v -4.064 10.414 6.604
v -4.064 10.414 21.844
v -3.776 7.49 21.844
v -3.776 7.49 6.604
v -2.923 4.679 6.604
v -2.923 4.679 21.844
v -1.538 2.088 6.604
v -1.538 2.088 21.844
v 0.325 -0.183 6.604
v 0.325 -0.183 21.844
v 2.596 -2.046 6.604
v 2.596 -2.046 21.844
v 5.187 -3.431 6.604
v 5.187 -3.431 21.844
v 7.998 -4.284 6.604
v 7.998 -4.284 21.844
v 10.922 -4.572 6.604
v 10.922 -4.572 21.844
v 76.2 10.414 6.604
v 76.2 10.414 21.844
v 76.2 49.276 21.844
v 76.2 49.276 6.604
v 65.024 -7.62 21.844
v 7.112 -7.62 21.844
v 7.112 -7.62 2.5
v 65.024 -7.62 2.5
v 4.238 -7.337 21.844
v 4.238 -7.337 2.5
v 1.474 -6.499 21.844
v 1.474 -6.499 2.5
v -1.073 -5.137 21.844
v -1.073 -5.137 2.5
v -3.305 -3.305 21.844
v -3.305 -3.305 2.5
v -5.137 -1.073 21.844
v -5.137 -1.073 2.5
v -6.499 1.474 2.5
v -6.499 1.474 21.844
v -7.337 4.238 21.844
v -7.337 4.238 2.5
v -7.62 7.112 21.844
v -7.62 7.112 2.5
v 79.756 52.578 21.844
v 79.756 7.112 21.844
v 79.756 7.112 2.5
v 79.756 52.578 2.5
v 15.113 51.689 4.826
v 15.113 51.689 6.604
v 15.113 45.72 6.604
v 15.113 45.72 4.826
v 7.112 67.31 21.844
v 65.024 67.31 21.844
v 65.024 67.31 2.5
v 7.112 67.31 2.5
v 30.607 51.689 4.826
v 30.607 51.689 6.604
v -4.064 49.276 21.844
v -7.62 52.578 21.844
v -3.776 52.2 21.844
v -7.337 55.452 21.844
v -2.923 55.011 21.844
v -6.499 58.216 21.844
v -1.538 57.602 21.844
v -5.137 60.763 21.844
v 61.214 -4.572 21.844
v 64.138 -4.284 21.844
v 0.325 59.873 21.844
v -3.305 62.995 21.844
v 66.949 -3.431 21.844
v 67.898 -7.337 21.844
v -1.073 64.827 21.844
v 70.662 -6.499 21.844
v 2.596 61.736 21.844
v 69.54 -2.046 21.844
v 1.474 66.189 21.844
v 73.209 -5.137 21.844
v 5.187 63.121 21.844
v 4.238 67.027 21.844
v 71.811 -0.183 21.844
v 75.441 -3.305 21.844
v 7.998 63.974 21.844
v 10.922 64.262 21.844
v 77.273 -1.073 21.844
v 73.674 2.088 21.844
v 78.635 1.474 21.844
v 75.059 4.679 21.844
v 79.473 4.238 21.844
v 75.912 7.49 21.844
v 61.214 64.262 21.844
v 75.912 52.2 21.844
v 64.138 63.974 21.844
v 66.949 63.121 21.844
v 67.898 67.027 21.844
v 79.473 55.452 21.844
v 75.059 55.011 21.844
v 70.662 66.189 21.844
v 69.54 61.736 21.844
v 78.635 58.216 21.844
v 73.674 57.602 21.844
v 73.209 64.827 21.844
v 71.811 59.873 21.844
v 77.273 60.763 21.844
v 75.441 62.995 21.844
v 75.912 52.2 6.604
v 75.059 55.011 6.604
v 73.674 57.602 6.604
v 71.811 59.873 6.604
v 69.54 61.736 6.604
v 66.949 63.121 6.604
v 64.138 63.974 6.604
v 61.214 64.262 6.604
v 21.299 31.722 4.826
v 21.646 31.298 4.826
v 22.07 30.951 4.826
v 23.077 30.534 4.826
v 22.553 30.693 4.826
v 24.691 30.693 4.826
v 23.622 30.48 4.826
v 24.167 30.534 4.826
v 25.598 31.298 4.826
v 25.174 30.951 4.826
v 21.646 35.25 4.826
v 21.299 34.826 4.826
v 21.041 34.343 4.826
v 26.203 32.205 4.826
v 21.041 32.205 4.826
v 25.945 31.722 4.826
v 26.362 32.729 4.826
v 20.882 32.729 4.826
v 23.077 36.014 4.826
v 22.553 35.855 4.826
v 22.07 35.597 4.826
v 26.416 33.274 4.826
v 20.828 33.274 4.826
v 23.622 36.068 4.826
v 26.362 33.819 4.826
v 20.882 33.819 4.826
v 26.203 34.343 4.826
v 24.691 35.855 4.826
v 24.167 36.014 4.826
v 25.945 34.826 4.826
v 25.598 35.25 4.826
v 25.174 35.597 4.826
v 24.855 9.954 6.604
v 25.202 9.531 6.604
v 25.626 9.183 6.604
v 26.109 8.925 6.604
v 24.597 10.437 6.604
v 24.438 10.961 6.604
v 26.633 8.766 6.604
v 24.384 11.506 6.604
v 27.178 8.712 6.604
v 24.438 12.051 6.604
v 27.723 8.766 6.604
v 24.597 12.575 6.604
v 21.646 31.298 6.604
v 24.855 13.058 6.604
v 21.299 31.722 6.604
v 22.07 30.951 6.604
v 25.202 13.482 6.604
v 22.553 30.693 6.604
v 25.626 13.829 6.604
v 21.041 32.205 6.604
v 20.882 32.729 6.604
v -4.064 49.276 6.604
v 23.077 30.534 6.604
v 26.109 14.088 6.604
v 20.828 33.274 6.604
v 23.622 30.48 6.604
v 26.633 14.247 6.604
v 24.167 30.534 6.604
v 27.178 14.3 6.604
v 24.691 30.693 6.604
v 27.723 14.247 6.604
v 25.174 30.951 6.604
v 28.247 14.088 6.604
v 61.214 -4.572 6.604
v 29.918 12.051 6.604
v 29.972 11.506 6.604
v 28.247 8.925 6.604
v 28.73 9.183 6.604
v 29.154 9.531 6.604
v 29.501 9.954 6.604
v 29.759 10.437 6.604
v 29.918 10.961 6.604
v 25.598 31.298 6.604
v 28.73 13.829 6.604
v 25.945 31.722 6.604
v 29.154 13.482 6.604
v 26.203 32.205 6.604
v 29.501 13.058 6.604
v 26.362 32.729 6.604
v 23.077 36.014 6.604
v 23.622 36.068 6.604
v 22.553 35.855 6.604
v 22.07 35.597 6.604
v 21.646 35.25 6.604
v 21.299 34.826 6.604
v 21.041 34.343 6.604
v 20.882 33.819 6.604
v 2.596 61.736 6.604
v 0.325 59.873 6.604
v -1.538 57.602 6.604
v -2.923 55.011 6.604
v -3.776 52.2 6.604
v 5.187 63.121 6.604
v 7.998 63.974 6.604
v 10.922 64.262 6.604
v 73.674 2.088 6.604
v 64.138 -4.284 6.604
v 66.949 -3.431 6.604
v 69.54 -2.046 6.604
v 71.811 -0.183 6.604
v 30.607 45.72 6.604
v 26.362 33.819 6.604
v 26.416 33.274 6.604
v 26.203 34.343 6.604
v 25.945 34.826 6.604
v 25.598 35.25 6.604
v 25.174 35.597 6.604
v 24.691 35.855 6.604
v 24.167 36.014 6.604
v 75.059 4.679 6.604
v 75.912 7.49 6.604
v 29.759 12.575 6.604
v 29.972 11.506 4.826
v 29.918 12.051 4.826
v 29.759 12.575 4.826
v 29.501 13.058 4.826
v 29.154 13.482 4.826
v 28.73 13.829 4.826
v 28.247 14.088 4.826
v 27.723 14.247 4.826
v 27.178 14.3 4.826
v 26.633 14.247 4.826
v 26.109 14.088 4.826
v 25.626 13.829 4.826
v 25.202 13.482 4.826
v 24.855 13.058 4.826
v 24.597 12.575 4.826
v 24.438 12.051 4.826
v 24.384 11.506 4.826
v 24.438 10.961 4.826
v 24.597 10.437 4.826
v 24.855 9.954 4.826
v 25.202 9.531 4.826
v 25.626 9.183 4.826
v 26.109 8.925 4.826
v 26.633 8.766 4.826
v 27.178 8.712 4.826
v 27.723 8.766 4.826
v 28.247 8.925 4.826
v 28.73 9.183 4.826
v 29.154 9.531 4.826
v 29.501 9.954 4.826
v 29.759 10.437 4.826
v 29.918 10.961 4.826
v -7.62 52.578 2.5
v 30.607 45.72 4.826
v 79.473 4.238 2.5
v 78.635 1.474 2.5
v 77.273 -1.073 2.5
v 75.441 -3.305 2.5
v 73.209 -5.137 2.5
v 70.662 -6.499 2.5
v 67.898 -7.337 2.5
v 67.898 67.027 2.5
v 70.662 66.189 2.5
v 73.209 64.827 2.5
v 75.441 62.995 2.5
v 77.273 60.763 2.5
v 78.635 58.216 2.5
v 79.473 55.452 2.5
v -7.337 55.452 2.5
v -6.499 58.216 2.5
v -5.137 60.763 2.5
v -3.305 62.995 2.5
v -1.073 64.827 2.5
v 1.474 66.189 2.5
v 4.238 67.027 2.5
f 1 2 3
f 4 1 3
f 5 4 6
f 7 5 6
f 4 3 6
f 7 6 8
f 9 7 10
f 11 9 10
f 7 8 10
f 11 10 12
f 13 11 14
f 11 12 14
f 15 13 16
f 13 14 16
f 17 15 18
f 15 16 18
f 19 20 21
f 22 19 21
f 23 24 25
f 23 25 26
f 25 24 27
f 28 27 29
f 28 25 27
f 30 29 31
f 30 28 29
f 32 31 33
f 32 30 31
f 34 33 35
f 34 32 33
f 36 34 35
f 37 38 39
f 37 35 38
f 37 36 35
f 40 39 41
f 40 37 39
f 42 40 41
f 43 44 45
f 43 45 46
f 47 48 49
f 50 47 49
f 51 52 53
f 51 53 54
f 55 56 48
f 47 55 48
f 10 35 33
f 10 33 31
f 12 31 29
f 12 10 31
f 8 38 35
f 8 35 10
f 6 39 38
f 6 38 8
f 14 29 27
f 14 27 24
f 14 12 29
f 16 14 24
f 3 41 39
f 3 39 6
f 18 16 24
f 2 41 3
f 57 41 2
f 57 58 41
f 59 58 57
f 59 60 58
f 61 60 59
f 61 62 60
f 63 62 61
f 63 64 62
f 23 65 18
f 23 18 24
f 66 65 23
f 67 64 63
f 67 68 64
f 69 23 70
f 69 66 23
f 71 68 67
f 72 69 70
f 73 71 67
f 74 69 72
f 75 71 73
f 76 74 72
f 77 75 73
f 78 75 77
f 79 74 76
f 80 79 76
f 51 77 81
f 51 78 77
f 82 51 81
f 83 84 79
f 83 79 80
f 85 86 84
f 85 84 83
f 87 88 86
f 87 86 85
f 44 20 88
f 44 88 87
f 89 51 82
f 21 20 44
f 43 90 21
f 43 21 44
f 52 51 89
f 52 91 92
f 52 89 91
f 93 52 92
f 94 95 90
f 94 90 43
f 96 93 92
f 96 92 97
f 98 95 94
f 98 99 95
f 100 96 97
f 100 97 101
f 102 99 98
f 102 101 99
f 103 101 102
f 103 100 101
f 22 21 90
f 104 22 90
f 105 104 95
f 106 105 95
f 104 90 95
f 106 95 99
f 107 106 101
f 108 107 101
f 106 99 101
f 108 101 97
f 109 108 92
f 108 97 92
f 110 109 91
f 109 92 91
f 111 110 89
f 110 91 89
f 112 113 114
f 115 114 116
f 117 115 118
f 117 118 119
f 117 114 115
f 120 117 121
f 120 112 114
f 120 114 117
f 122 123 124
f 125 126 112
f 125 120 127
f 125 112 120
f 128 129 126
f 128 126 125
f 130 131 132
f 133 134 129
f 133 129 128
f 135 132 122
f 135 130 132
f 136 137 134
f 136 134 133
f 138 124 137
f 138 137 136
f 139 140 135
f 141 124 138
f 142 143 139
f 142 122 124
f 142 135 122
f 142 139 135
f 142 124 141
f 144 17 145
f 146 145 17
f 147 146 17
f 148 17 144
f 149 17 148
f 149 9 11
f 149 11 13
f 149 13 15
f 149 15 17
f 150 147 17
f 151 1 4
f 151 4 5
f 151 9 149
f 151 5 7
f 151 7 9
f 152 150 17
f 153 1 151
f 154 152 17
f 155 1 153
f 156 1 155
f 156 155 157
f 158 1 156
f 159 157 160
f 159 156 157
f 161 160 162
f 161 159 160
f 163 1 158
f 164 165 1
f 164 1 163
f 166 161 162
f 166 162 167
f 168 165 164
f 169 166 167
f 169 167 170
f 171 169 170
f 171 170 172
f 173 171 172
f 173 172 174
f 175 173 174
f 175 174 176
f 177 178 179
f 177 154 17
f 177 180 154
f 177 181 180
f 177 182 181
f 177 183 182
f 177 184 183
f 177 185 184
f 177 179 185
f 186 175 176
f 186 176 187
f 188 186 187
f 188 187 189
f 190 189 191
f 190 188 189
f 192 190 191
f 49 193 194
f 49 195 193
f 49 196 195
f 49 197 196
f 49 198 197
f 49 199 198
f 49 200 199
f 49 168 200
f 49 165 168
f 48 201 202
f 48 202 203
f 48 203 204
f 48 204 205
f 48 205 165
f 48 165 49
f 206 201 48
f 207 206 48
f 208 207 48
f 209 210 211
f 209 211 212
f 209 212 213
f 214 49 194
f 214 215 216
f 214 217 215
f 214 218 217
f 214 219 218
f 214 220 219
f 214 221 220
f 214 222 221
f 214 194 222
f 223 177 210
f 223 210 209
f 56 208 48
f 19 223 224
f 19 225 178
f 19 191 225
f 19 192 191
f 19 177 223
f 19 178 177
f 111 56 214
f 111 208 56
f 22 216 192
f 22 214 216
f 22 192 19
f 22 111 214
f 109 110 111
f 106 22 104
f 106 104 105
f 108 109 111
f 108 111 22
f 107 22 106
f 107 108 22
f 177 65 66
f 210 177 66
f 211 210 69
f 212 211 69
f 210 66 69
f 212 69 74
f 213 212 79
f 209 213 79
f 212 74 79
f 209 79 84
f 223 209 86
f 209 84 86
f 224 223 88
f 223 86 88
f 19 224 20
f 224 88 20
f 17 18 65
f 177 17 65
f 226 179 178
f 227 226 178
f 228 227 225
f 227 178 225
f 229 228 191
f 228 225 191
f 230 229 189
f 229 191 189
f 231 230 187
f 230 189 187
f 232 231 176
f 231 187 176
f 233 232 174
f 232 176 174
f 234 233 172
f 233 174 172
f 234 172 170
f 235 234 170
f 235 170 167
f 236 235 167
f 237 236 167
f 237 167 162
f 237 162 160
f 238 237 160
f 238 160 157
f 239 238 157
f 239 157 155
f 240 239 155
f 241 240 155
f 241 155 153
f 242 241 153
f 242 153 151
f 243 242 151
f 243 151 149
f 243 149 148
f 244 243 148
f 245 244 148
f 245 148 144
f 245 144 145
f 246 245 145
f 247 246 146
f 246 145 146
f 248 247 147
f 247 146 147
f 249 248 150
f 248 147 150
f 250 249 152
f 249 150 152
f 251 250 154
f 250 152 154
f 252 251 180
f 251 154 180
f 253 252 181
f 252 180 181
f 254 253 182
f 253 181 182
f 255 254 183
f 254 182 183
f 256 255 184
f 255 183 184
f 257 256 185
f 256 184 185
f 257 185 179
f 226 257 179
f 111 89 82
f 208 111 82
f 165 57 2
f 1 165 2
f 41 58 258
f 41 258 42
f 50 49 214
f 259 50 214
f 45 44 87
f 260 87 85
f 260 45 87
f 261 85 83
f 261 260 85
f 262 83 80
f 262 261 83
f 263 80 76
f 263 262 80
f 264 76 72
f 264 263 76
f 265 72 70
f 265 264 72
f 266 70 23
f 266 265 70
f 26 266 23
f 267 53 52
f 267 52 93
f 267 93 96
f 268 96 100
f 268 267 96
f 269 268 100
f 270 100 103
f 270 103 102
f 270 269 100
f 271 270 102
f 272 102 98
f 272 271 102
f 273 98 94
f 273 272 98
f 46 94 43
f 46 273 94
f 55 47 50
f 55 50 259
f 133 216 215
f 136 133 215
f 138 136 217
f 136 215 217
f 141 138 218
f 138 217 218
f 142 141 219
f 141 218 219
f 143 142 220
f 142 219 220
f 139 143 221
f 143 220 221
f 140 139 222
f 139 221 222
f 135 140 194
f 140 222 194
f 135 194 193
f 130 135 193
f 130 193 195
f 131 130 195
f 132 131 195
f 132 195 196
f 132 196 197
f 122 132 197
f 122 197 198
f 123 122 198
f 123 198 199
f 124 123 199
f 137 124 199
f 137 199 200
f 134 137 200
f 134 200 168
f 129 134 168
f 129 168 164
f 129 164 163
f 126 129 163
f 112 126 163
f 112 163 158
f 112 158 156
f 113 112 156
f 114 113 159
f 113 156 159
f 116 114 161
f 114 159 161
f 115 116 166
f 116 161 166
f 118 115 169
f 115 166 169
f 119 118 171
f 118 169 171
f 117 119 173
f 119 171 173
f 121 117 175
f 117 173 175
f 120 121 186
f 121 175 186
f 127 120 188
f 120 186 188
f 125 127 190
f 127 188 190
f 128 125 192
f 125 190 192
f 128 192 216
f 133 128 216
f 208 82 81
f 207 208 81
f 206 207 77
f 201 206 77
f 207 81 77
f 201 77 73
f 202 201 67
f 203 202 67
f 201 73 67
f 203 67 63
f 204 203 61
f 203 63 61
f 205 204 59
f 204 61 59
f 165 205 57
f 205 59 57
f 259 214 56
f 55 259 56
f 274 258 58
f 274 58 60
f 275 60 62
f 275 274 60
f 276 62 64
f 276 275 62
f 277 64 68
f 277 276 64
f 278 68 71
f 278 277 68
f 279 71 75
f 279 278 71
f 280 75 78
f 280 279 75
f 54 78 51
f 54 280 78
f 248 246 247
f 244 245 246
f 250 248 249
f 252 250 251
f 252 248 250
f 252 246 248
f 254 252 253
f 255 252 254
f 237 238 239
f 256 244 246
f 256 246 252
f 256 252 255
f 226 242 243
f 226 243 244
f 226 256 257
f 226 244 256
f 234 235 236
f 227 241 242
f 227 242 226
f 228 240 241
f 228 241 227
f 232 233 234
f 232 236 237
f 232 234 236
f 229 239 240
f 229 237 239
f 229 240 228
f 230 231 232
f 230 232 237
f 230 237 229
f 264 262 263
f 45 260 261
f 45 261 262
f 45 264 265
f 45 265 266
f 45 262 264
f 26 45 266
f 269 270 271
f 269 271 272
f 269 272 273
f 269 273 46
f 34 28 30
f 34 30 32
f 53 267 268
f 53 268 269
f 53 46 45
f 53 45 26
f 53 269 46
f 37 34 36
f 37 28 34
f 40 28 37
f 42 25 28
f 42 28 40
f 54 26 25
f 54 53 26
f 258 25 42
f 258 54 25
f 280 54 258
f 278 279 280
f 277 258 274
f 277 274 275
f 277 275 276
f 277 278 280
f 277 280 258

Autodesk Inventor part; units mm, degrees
ref_plane "YZ Plane" through (0, 0, 0) normal (1, 0, 0) x (0, 1, 0)
ref_plane "XZ Plane" through (0, 0, 0) normal (0, 1, 0) x (-1, 0, 0)
ref_plane "XY Plane" through (0, 0, 0) normal (0, 0, 1) x (1, 0, 0)
sketch "Sketch1" plane through (0, 0, 0) normal (0, 0, 1) x (1, 0, 0)
  line L0 (0, 0) -> (72.136, 0)
  line L1 (72.136, 0) -> (72.136, 59.69)
  line L2 (72.136, 59.69) -> (0, 59.69)
  line L3 (0, 59.69) -> (0, 0)
  dimension "d0" = 59.69
  dimension "d1" = 72.136
extrude "Extrusion1" add sketch "Sketch1" along normal blind 21.844
sketch "Sketch2" plane through (0, 0, 21.844) normal (0, 0, 1) x (1, 0, 0)
  line L0 (3.048, 56.642) -> (69.088, 56.642)
  line L1 (69.088, 56.642) -> (69.088, 3.048)
  line L2 (69.088, 3.048) -> (3.048, 3.048)
  line L3 (3.048, 3.048) -> (3.048, 56.642)
  line L4 (72.136, 59.69) -> (0, 59.69) projected
  line L5 (72.136, 0) -> (72.136, 59.69) projected
  line L6 (0, 0) -> (72.136, 0) projected
  line L7 (0, 59.69) -> (0, 0) projected
  dimension "d4" = 3.048
  dimension "d5" = 3.048
  dimension "d6" = 3.048
  dimension "d7" = 3.048
extrude "Extrusion2" cut sketch "Sketch2" against normal blind 15.24 contours L0 L1 L2 L3
sketch "Sketch3" plane through (0, 0, 6.604) normal (0, 0, 1) x (1, 0, 0)
  line L0 (15.113, 45.72) -> (30.607, 45.72)
  line L1 (30.607, 45.72) -> (30.607, 51.689)
  line L2 (30.607, 51.689) -> (15.113, 51.689)
  line L3 (15.113, 51.689) -> (15.113, 45.72)
  line L4 (3.048, 56.642) -> (69.088, 56.642) projected
  line L5 (3.048, 3.048) -> (3.048, 56.642) projected
  circle A0 centre (23.622, 33.274) radius 2.794
  circle A1 centre (27.178, 11.5062) radius 2.794
  point P0 (0, 0)
  dimension "d10" = 5.969
  dimension "d11" = 15.494
  dimension "d12" = 4.953
  dimension "d13" = 12.065
  dimension "d14" = 5.588
  dimension "d15" = 5.588
  dimension "d17" = 24.13
  dimension "d18" = 20.574
  dimension "d21" = 23.368
  dimension "d22" = 45.1358
extrude "Extrusion3" cut sketch "Sketch3" against normal blind 1.778
sketch "Sketch4" plane through (0, 0, 21.844) normal (0, 0, 1) x (1, 0, 0)
  point P0 (0, 0)
sketch "Sketch5" plane through (0, 0, 21.844) normal (0, 0, 1) x (1, 0, 0)
  line L0 (-2.54, -2.54) -> (74.676, -2.54)
  line L1 (74.676, -2.54) -> (74.676, 62.23)
  line L2 (74.676, 62.23) -> (-2.54, 62.23)
  line L3 (-2.54, 62.23) -> (-2.54, -2.54)
  line L4 (72.136, 0) -> (72.136, 59.69) projected
  line L5 (72.136, 59.69) -> (0, 59.69) projected
  line L6 (0, 59.69) -> (0, 0) projected
  line L7 (0, 0) -> (72.136, 0) projected
  line L8 (0, 0) -> (72.136, 0)
  line L9 (72.136, 0) -> (72.136, 59.69)
  line L10 (72.136, 59.69) -> (0, 59.69)
  line L11 (0, 59.69) -> (0, 0)
  dimension "d23" = 2.54
  dimension "d24" = 2.54
  dimension "d25" = 2.54
  dimension "d26" = 2.54
extrude "Extrusion4" add sketch "Sketch5" against normal blind 21.844
sketch "Sketch6" plane through (0, 0, 21.844) normal (0, 0, 1) x (1, 0, 0)
  line L0 (-0.762, -0.762) -> (72.898, -0.762)
  line L1 (72.898, -0.762) -> (72.898, 60.452)
  line L2 (72.898, 60.452) -> (-0.762, 60.452)
  line L3 (-0.762, 60.452) -> (-0.762, -0.762)
  line L4 (3.048, 3.048) -> (3.048, 56.642) projected
  line L5 (3.048, 56.642) -> (69.088, 56.642) projected
  line L6 (69.088, 56.642) -> (69.088, 3.048) projected
  line L7 (69.088, 3.048) -> (3.048, 3.048) projected
  point P0 (0, 0)
  dimension "d29" = 3.81
  dimension "d30" = 3.81
  dimension "d31" = 3.81
  dimension "d32" = 3.81
extrude "Extrusion5" cut sketch "Sketch6" against normal blind 15.24
sketch "Sketch7" plane through (0, 0, 21.844) normal (0, 0, 1) x (1, 0, 0)
  point P0 (0, 0)
sketch "Sketch8" plane through (0, 0, 21.844) normal (0, 0, 1) x (1, 0, 0)
  line L0 (74.676, -2.54) -> (-2.54, -2.54) projected
  line L1 (-2.54, -2.54) -> (74.676, -2.54)
  line L2 (74.676, -2.54) -> (74.676, 62.23)
  line L3 (74.676, 62.23) -> (-2.54, 62.23)
  line L4 (-2.54, 62.23) -> (-2.54, -2.54)
  line L5 (-7.62, -7.62) -> (79.756, -7.62)
  line L6 (79.756, -7.62) -> (79.756, 67.31)
  line L7 (79.756, 67.31) -> (-7.62, 67.31)
  line L8 (-7.62, 67.31) -> (-7.62, -7.62)
  point P0 (0, 0)
  dimension "d35" = 5.08
  dimension "d36" = 5.08
  dimension "d37" = 5.08
  dimension "d38" = 5.08
extrude "Extrusion6" add sketch "Sketch8" against normal blind 21.844
sketch "Sketch10" plane through (0, 0, 21.844) normal (0, 0, 1) x (1, 0, 0)
  point P0 (0, 0)
sketch "Sketch15" plane through (0, 0, 21.844) normal (0, 0, 1) x (1, 0, 0)
  line L0 (72.898, -0.762) -> (-0.762, -0.762) projected
  line L1 (-0.762, 60.452) -> (72.898, 60.452) projected
  line L2 (-0.762, -0.762) -> (72.898, -0.762)
  line L3 (72.898, -0.762) -> (72.898, 60.452)
  line L4 (72.898, 60.452) -> (-0.762, 60.452)
  line L5 (-0.762, 60.452) -> (-0.762, -0.762)
  line L6 (70.358, 57.912) -> (1.778, 57.912)
  line L7 (1.778, 57.912) -> (1.778, 1.778)
  line L8 (1.778, 1.778) -> (70.358, 1.778)
  line L9 (70.358, 1.778) -> (70.358, 57.912)
  point P0 (0, 0)
  dimension "d63" = 2.54
  dimension "d64" = 2.54
  dimension "d65" = 2.54
  dimension "d66" = 2.54
extrude "Extrusion8" add sketch "Sketch15" against normal blind 15.24
sketch "Sketch16" plane through (0, 0, 21.844) normal (0, 0, 1) x (1, 0, 0)
  line L0 (10.922, -4.572) -> (61.214, -4.572)
  line L1 (76.2, 10.414) -> (76.2, 49.276)
  line L2 (61.214, 64.262) -> (10.922, 64.262)
  line L3 (-4.064, 49.276) -> (-4.064, 10.414)
  line L4 (1.778, 57.912) -> (70.358, 57.912) projected
  line L5 (70.358, 1.778) -> (1.778, 1.778) projected
  line L6 (1.778, 1.778) -> (1.778, 57.912) projected
  line L7 (70.358, 57.912) -> (70.358, 1.778) projected
  line L8 (1.778, 57.912) -> (1.778, 1.778) projected
  line L9 (70.358, 1.778) -> (70.358, 57.912) projected
  line L10 (1.778, 1.778) -> (70.358, 1.778)
  line L11 (70.358, 1.778) -> (70.358, 57.912)
  line L12 (70.358, 57.912) -> (1.778, 57.912)
  line L13 (1.778, 57.912) -> (1.778, 1.778)
  arc A0 (-4.064, 10.414) -> (10.922, -4.572) centre (10.922, 10.414) ccw
  arc A1 (10.922, 64.262) -> (-4.064, 49.276) centre (10.922, 49.276) ccw
  arc A2 (76.2, 49.276) -> (61.214, 64.262) centre (61.214, 49.276) ccw
  arc A3 (61.214, -4.572) -> (76.2, 10.414) centre (61.214, 10.414) ccw
  point P0 (0, 0)
  dimension "d69" = 6.35
  dimension "d70" = 6.35
  dimension "d71" = 5.842
  dimension "d72" = 5.842
  dimension "d73" = 14.986
extrude "Extrusion9" cut sketch "Sketch16" against normal blind 15.24
fillet "Fillet2" radius 14.732 4 edges at (79.756, 67.31, 10.922) (79.756, -7.62, 10.922) (-7.62, 67.31, 10.922) (-7.62, -7.62, 10.922)
sketch "Sketch17" plane through (0, 0, 0) normal (0, 0, -1) x (-1, 0, 0)
  line L0 (-94.7004, 78.8948) -> (24.3491, 78.8948)
  line L1 (24.3491, 78.8948) -> (24.3491, -15.2836)
  line L2 (24.3491, -15.2836) -> (-94.7004, -15.2836)
  line L3 (-94.7004, -15.2836) -> (-94.7004, 78.8948)
  point P0 (0, 0)
extrude "Extrusion10" cut sketch "Sketch17" against normal blind 2.5
properties part number "Bottom_Housing_K30"
